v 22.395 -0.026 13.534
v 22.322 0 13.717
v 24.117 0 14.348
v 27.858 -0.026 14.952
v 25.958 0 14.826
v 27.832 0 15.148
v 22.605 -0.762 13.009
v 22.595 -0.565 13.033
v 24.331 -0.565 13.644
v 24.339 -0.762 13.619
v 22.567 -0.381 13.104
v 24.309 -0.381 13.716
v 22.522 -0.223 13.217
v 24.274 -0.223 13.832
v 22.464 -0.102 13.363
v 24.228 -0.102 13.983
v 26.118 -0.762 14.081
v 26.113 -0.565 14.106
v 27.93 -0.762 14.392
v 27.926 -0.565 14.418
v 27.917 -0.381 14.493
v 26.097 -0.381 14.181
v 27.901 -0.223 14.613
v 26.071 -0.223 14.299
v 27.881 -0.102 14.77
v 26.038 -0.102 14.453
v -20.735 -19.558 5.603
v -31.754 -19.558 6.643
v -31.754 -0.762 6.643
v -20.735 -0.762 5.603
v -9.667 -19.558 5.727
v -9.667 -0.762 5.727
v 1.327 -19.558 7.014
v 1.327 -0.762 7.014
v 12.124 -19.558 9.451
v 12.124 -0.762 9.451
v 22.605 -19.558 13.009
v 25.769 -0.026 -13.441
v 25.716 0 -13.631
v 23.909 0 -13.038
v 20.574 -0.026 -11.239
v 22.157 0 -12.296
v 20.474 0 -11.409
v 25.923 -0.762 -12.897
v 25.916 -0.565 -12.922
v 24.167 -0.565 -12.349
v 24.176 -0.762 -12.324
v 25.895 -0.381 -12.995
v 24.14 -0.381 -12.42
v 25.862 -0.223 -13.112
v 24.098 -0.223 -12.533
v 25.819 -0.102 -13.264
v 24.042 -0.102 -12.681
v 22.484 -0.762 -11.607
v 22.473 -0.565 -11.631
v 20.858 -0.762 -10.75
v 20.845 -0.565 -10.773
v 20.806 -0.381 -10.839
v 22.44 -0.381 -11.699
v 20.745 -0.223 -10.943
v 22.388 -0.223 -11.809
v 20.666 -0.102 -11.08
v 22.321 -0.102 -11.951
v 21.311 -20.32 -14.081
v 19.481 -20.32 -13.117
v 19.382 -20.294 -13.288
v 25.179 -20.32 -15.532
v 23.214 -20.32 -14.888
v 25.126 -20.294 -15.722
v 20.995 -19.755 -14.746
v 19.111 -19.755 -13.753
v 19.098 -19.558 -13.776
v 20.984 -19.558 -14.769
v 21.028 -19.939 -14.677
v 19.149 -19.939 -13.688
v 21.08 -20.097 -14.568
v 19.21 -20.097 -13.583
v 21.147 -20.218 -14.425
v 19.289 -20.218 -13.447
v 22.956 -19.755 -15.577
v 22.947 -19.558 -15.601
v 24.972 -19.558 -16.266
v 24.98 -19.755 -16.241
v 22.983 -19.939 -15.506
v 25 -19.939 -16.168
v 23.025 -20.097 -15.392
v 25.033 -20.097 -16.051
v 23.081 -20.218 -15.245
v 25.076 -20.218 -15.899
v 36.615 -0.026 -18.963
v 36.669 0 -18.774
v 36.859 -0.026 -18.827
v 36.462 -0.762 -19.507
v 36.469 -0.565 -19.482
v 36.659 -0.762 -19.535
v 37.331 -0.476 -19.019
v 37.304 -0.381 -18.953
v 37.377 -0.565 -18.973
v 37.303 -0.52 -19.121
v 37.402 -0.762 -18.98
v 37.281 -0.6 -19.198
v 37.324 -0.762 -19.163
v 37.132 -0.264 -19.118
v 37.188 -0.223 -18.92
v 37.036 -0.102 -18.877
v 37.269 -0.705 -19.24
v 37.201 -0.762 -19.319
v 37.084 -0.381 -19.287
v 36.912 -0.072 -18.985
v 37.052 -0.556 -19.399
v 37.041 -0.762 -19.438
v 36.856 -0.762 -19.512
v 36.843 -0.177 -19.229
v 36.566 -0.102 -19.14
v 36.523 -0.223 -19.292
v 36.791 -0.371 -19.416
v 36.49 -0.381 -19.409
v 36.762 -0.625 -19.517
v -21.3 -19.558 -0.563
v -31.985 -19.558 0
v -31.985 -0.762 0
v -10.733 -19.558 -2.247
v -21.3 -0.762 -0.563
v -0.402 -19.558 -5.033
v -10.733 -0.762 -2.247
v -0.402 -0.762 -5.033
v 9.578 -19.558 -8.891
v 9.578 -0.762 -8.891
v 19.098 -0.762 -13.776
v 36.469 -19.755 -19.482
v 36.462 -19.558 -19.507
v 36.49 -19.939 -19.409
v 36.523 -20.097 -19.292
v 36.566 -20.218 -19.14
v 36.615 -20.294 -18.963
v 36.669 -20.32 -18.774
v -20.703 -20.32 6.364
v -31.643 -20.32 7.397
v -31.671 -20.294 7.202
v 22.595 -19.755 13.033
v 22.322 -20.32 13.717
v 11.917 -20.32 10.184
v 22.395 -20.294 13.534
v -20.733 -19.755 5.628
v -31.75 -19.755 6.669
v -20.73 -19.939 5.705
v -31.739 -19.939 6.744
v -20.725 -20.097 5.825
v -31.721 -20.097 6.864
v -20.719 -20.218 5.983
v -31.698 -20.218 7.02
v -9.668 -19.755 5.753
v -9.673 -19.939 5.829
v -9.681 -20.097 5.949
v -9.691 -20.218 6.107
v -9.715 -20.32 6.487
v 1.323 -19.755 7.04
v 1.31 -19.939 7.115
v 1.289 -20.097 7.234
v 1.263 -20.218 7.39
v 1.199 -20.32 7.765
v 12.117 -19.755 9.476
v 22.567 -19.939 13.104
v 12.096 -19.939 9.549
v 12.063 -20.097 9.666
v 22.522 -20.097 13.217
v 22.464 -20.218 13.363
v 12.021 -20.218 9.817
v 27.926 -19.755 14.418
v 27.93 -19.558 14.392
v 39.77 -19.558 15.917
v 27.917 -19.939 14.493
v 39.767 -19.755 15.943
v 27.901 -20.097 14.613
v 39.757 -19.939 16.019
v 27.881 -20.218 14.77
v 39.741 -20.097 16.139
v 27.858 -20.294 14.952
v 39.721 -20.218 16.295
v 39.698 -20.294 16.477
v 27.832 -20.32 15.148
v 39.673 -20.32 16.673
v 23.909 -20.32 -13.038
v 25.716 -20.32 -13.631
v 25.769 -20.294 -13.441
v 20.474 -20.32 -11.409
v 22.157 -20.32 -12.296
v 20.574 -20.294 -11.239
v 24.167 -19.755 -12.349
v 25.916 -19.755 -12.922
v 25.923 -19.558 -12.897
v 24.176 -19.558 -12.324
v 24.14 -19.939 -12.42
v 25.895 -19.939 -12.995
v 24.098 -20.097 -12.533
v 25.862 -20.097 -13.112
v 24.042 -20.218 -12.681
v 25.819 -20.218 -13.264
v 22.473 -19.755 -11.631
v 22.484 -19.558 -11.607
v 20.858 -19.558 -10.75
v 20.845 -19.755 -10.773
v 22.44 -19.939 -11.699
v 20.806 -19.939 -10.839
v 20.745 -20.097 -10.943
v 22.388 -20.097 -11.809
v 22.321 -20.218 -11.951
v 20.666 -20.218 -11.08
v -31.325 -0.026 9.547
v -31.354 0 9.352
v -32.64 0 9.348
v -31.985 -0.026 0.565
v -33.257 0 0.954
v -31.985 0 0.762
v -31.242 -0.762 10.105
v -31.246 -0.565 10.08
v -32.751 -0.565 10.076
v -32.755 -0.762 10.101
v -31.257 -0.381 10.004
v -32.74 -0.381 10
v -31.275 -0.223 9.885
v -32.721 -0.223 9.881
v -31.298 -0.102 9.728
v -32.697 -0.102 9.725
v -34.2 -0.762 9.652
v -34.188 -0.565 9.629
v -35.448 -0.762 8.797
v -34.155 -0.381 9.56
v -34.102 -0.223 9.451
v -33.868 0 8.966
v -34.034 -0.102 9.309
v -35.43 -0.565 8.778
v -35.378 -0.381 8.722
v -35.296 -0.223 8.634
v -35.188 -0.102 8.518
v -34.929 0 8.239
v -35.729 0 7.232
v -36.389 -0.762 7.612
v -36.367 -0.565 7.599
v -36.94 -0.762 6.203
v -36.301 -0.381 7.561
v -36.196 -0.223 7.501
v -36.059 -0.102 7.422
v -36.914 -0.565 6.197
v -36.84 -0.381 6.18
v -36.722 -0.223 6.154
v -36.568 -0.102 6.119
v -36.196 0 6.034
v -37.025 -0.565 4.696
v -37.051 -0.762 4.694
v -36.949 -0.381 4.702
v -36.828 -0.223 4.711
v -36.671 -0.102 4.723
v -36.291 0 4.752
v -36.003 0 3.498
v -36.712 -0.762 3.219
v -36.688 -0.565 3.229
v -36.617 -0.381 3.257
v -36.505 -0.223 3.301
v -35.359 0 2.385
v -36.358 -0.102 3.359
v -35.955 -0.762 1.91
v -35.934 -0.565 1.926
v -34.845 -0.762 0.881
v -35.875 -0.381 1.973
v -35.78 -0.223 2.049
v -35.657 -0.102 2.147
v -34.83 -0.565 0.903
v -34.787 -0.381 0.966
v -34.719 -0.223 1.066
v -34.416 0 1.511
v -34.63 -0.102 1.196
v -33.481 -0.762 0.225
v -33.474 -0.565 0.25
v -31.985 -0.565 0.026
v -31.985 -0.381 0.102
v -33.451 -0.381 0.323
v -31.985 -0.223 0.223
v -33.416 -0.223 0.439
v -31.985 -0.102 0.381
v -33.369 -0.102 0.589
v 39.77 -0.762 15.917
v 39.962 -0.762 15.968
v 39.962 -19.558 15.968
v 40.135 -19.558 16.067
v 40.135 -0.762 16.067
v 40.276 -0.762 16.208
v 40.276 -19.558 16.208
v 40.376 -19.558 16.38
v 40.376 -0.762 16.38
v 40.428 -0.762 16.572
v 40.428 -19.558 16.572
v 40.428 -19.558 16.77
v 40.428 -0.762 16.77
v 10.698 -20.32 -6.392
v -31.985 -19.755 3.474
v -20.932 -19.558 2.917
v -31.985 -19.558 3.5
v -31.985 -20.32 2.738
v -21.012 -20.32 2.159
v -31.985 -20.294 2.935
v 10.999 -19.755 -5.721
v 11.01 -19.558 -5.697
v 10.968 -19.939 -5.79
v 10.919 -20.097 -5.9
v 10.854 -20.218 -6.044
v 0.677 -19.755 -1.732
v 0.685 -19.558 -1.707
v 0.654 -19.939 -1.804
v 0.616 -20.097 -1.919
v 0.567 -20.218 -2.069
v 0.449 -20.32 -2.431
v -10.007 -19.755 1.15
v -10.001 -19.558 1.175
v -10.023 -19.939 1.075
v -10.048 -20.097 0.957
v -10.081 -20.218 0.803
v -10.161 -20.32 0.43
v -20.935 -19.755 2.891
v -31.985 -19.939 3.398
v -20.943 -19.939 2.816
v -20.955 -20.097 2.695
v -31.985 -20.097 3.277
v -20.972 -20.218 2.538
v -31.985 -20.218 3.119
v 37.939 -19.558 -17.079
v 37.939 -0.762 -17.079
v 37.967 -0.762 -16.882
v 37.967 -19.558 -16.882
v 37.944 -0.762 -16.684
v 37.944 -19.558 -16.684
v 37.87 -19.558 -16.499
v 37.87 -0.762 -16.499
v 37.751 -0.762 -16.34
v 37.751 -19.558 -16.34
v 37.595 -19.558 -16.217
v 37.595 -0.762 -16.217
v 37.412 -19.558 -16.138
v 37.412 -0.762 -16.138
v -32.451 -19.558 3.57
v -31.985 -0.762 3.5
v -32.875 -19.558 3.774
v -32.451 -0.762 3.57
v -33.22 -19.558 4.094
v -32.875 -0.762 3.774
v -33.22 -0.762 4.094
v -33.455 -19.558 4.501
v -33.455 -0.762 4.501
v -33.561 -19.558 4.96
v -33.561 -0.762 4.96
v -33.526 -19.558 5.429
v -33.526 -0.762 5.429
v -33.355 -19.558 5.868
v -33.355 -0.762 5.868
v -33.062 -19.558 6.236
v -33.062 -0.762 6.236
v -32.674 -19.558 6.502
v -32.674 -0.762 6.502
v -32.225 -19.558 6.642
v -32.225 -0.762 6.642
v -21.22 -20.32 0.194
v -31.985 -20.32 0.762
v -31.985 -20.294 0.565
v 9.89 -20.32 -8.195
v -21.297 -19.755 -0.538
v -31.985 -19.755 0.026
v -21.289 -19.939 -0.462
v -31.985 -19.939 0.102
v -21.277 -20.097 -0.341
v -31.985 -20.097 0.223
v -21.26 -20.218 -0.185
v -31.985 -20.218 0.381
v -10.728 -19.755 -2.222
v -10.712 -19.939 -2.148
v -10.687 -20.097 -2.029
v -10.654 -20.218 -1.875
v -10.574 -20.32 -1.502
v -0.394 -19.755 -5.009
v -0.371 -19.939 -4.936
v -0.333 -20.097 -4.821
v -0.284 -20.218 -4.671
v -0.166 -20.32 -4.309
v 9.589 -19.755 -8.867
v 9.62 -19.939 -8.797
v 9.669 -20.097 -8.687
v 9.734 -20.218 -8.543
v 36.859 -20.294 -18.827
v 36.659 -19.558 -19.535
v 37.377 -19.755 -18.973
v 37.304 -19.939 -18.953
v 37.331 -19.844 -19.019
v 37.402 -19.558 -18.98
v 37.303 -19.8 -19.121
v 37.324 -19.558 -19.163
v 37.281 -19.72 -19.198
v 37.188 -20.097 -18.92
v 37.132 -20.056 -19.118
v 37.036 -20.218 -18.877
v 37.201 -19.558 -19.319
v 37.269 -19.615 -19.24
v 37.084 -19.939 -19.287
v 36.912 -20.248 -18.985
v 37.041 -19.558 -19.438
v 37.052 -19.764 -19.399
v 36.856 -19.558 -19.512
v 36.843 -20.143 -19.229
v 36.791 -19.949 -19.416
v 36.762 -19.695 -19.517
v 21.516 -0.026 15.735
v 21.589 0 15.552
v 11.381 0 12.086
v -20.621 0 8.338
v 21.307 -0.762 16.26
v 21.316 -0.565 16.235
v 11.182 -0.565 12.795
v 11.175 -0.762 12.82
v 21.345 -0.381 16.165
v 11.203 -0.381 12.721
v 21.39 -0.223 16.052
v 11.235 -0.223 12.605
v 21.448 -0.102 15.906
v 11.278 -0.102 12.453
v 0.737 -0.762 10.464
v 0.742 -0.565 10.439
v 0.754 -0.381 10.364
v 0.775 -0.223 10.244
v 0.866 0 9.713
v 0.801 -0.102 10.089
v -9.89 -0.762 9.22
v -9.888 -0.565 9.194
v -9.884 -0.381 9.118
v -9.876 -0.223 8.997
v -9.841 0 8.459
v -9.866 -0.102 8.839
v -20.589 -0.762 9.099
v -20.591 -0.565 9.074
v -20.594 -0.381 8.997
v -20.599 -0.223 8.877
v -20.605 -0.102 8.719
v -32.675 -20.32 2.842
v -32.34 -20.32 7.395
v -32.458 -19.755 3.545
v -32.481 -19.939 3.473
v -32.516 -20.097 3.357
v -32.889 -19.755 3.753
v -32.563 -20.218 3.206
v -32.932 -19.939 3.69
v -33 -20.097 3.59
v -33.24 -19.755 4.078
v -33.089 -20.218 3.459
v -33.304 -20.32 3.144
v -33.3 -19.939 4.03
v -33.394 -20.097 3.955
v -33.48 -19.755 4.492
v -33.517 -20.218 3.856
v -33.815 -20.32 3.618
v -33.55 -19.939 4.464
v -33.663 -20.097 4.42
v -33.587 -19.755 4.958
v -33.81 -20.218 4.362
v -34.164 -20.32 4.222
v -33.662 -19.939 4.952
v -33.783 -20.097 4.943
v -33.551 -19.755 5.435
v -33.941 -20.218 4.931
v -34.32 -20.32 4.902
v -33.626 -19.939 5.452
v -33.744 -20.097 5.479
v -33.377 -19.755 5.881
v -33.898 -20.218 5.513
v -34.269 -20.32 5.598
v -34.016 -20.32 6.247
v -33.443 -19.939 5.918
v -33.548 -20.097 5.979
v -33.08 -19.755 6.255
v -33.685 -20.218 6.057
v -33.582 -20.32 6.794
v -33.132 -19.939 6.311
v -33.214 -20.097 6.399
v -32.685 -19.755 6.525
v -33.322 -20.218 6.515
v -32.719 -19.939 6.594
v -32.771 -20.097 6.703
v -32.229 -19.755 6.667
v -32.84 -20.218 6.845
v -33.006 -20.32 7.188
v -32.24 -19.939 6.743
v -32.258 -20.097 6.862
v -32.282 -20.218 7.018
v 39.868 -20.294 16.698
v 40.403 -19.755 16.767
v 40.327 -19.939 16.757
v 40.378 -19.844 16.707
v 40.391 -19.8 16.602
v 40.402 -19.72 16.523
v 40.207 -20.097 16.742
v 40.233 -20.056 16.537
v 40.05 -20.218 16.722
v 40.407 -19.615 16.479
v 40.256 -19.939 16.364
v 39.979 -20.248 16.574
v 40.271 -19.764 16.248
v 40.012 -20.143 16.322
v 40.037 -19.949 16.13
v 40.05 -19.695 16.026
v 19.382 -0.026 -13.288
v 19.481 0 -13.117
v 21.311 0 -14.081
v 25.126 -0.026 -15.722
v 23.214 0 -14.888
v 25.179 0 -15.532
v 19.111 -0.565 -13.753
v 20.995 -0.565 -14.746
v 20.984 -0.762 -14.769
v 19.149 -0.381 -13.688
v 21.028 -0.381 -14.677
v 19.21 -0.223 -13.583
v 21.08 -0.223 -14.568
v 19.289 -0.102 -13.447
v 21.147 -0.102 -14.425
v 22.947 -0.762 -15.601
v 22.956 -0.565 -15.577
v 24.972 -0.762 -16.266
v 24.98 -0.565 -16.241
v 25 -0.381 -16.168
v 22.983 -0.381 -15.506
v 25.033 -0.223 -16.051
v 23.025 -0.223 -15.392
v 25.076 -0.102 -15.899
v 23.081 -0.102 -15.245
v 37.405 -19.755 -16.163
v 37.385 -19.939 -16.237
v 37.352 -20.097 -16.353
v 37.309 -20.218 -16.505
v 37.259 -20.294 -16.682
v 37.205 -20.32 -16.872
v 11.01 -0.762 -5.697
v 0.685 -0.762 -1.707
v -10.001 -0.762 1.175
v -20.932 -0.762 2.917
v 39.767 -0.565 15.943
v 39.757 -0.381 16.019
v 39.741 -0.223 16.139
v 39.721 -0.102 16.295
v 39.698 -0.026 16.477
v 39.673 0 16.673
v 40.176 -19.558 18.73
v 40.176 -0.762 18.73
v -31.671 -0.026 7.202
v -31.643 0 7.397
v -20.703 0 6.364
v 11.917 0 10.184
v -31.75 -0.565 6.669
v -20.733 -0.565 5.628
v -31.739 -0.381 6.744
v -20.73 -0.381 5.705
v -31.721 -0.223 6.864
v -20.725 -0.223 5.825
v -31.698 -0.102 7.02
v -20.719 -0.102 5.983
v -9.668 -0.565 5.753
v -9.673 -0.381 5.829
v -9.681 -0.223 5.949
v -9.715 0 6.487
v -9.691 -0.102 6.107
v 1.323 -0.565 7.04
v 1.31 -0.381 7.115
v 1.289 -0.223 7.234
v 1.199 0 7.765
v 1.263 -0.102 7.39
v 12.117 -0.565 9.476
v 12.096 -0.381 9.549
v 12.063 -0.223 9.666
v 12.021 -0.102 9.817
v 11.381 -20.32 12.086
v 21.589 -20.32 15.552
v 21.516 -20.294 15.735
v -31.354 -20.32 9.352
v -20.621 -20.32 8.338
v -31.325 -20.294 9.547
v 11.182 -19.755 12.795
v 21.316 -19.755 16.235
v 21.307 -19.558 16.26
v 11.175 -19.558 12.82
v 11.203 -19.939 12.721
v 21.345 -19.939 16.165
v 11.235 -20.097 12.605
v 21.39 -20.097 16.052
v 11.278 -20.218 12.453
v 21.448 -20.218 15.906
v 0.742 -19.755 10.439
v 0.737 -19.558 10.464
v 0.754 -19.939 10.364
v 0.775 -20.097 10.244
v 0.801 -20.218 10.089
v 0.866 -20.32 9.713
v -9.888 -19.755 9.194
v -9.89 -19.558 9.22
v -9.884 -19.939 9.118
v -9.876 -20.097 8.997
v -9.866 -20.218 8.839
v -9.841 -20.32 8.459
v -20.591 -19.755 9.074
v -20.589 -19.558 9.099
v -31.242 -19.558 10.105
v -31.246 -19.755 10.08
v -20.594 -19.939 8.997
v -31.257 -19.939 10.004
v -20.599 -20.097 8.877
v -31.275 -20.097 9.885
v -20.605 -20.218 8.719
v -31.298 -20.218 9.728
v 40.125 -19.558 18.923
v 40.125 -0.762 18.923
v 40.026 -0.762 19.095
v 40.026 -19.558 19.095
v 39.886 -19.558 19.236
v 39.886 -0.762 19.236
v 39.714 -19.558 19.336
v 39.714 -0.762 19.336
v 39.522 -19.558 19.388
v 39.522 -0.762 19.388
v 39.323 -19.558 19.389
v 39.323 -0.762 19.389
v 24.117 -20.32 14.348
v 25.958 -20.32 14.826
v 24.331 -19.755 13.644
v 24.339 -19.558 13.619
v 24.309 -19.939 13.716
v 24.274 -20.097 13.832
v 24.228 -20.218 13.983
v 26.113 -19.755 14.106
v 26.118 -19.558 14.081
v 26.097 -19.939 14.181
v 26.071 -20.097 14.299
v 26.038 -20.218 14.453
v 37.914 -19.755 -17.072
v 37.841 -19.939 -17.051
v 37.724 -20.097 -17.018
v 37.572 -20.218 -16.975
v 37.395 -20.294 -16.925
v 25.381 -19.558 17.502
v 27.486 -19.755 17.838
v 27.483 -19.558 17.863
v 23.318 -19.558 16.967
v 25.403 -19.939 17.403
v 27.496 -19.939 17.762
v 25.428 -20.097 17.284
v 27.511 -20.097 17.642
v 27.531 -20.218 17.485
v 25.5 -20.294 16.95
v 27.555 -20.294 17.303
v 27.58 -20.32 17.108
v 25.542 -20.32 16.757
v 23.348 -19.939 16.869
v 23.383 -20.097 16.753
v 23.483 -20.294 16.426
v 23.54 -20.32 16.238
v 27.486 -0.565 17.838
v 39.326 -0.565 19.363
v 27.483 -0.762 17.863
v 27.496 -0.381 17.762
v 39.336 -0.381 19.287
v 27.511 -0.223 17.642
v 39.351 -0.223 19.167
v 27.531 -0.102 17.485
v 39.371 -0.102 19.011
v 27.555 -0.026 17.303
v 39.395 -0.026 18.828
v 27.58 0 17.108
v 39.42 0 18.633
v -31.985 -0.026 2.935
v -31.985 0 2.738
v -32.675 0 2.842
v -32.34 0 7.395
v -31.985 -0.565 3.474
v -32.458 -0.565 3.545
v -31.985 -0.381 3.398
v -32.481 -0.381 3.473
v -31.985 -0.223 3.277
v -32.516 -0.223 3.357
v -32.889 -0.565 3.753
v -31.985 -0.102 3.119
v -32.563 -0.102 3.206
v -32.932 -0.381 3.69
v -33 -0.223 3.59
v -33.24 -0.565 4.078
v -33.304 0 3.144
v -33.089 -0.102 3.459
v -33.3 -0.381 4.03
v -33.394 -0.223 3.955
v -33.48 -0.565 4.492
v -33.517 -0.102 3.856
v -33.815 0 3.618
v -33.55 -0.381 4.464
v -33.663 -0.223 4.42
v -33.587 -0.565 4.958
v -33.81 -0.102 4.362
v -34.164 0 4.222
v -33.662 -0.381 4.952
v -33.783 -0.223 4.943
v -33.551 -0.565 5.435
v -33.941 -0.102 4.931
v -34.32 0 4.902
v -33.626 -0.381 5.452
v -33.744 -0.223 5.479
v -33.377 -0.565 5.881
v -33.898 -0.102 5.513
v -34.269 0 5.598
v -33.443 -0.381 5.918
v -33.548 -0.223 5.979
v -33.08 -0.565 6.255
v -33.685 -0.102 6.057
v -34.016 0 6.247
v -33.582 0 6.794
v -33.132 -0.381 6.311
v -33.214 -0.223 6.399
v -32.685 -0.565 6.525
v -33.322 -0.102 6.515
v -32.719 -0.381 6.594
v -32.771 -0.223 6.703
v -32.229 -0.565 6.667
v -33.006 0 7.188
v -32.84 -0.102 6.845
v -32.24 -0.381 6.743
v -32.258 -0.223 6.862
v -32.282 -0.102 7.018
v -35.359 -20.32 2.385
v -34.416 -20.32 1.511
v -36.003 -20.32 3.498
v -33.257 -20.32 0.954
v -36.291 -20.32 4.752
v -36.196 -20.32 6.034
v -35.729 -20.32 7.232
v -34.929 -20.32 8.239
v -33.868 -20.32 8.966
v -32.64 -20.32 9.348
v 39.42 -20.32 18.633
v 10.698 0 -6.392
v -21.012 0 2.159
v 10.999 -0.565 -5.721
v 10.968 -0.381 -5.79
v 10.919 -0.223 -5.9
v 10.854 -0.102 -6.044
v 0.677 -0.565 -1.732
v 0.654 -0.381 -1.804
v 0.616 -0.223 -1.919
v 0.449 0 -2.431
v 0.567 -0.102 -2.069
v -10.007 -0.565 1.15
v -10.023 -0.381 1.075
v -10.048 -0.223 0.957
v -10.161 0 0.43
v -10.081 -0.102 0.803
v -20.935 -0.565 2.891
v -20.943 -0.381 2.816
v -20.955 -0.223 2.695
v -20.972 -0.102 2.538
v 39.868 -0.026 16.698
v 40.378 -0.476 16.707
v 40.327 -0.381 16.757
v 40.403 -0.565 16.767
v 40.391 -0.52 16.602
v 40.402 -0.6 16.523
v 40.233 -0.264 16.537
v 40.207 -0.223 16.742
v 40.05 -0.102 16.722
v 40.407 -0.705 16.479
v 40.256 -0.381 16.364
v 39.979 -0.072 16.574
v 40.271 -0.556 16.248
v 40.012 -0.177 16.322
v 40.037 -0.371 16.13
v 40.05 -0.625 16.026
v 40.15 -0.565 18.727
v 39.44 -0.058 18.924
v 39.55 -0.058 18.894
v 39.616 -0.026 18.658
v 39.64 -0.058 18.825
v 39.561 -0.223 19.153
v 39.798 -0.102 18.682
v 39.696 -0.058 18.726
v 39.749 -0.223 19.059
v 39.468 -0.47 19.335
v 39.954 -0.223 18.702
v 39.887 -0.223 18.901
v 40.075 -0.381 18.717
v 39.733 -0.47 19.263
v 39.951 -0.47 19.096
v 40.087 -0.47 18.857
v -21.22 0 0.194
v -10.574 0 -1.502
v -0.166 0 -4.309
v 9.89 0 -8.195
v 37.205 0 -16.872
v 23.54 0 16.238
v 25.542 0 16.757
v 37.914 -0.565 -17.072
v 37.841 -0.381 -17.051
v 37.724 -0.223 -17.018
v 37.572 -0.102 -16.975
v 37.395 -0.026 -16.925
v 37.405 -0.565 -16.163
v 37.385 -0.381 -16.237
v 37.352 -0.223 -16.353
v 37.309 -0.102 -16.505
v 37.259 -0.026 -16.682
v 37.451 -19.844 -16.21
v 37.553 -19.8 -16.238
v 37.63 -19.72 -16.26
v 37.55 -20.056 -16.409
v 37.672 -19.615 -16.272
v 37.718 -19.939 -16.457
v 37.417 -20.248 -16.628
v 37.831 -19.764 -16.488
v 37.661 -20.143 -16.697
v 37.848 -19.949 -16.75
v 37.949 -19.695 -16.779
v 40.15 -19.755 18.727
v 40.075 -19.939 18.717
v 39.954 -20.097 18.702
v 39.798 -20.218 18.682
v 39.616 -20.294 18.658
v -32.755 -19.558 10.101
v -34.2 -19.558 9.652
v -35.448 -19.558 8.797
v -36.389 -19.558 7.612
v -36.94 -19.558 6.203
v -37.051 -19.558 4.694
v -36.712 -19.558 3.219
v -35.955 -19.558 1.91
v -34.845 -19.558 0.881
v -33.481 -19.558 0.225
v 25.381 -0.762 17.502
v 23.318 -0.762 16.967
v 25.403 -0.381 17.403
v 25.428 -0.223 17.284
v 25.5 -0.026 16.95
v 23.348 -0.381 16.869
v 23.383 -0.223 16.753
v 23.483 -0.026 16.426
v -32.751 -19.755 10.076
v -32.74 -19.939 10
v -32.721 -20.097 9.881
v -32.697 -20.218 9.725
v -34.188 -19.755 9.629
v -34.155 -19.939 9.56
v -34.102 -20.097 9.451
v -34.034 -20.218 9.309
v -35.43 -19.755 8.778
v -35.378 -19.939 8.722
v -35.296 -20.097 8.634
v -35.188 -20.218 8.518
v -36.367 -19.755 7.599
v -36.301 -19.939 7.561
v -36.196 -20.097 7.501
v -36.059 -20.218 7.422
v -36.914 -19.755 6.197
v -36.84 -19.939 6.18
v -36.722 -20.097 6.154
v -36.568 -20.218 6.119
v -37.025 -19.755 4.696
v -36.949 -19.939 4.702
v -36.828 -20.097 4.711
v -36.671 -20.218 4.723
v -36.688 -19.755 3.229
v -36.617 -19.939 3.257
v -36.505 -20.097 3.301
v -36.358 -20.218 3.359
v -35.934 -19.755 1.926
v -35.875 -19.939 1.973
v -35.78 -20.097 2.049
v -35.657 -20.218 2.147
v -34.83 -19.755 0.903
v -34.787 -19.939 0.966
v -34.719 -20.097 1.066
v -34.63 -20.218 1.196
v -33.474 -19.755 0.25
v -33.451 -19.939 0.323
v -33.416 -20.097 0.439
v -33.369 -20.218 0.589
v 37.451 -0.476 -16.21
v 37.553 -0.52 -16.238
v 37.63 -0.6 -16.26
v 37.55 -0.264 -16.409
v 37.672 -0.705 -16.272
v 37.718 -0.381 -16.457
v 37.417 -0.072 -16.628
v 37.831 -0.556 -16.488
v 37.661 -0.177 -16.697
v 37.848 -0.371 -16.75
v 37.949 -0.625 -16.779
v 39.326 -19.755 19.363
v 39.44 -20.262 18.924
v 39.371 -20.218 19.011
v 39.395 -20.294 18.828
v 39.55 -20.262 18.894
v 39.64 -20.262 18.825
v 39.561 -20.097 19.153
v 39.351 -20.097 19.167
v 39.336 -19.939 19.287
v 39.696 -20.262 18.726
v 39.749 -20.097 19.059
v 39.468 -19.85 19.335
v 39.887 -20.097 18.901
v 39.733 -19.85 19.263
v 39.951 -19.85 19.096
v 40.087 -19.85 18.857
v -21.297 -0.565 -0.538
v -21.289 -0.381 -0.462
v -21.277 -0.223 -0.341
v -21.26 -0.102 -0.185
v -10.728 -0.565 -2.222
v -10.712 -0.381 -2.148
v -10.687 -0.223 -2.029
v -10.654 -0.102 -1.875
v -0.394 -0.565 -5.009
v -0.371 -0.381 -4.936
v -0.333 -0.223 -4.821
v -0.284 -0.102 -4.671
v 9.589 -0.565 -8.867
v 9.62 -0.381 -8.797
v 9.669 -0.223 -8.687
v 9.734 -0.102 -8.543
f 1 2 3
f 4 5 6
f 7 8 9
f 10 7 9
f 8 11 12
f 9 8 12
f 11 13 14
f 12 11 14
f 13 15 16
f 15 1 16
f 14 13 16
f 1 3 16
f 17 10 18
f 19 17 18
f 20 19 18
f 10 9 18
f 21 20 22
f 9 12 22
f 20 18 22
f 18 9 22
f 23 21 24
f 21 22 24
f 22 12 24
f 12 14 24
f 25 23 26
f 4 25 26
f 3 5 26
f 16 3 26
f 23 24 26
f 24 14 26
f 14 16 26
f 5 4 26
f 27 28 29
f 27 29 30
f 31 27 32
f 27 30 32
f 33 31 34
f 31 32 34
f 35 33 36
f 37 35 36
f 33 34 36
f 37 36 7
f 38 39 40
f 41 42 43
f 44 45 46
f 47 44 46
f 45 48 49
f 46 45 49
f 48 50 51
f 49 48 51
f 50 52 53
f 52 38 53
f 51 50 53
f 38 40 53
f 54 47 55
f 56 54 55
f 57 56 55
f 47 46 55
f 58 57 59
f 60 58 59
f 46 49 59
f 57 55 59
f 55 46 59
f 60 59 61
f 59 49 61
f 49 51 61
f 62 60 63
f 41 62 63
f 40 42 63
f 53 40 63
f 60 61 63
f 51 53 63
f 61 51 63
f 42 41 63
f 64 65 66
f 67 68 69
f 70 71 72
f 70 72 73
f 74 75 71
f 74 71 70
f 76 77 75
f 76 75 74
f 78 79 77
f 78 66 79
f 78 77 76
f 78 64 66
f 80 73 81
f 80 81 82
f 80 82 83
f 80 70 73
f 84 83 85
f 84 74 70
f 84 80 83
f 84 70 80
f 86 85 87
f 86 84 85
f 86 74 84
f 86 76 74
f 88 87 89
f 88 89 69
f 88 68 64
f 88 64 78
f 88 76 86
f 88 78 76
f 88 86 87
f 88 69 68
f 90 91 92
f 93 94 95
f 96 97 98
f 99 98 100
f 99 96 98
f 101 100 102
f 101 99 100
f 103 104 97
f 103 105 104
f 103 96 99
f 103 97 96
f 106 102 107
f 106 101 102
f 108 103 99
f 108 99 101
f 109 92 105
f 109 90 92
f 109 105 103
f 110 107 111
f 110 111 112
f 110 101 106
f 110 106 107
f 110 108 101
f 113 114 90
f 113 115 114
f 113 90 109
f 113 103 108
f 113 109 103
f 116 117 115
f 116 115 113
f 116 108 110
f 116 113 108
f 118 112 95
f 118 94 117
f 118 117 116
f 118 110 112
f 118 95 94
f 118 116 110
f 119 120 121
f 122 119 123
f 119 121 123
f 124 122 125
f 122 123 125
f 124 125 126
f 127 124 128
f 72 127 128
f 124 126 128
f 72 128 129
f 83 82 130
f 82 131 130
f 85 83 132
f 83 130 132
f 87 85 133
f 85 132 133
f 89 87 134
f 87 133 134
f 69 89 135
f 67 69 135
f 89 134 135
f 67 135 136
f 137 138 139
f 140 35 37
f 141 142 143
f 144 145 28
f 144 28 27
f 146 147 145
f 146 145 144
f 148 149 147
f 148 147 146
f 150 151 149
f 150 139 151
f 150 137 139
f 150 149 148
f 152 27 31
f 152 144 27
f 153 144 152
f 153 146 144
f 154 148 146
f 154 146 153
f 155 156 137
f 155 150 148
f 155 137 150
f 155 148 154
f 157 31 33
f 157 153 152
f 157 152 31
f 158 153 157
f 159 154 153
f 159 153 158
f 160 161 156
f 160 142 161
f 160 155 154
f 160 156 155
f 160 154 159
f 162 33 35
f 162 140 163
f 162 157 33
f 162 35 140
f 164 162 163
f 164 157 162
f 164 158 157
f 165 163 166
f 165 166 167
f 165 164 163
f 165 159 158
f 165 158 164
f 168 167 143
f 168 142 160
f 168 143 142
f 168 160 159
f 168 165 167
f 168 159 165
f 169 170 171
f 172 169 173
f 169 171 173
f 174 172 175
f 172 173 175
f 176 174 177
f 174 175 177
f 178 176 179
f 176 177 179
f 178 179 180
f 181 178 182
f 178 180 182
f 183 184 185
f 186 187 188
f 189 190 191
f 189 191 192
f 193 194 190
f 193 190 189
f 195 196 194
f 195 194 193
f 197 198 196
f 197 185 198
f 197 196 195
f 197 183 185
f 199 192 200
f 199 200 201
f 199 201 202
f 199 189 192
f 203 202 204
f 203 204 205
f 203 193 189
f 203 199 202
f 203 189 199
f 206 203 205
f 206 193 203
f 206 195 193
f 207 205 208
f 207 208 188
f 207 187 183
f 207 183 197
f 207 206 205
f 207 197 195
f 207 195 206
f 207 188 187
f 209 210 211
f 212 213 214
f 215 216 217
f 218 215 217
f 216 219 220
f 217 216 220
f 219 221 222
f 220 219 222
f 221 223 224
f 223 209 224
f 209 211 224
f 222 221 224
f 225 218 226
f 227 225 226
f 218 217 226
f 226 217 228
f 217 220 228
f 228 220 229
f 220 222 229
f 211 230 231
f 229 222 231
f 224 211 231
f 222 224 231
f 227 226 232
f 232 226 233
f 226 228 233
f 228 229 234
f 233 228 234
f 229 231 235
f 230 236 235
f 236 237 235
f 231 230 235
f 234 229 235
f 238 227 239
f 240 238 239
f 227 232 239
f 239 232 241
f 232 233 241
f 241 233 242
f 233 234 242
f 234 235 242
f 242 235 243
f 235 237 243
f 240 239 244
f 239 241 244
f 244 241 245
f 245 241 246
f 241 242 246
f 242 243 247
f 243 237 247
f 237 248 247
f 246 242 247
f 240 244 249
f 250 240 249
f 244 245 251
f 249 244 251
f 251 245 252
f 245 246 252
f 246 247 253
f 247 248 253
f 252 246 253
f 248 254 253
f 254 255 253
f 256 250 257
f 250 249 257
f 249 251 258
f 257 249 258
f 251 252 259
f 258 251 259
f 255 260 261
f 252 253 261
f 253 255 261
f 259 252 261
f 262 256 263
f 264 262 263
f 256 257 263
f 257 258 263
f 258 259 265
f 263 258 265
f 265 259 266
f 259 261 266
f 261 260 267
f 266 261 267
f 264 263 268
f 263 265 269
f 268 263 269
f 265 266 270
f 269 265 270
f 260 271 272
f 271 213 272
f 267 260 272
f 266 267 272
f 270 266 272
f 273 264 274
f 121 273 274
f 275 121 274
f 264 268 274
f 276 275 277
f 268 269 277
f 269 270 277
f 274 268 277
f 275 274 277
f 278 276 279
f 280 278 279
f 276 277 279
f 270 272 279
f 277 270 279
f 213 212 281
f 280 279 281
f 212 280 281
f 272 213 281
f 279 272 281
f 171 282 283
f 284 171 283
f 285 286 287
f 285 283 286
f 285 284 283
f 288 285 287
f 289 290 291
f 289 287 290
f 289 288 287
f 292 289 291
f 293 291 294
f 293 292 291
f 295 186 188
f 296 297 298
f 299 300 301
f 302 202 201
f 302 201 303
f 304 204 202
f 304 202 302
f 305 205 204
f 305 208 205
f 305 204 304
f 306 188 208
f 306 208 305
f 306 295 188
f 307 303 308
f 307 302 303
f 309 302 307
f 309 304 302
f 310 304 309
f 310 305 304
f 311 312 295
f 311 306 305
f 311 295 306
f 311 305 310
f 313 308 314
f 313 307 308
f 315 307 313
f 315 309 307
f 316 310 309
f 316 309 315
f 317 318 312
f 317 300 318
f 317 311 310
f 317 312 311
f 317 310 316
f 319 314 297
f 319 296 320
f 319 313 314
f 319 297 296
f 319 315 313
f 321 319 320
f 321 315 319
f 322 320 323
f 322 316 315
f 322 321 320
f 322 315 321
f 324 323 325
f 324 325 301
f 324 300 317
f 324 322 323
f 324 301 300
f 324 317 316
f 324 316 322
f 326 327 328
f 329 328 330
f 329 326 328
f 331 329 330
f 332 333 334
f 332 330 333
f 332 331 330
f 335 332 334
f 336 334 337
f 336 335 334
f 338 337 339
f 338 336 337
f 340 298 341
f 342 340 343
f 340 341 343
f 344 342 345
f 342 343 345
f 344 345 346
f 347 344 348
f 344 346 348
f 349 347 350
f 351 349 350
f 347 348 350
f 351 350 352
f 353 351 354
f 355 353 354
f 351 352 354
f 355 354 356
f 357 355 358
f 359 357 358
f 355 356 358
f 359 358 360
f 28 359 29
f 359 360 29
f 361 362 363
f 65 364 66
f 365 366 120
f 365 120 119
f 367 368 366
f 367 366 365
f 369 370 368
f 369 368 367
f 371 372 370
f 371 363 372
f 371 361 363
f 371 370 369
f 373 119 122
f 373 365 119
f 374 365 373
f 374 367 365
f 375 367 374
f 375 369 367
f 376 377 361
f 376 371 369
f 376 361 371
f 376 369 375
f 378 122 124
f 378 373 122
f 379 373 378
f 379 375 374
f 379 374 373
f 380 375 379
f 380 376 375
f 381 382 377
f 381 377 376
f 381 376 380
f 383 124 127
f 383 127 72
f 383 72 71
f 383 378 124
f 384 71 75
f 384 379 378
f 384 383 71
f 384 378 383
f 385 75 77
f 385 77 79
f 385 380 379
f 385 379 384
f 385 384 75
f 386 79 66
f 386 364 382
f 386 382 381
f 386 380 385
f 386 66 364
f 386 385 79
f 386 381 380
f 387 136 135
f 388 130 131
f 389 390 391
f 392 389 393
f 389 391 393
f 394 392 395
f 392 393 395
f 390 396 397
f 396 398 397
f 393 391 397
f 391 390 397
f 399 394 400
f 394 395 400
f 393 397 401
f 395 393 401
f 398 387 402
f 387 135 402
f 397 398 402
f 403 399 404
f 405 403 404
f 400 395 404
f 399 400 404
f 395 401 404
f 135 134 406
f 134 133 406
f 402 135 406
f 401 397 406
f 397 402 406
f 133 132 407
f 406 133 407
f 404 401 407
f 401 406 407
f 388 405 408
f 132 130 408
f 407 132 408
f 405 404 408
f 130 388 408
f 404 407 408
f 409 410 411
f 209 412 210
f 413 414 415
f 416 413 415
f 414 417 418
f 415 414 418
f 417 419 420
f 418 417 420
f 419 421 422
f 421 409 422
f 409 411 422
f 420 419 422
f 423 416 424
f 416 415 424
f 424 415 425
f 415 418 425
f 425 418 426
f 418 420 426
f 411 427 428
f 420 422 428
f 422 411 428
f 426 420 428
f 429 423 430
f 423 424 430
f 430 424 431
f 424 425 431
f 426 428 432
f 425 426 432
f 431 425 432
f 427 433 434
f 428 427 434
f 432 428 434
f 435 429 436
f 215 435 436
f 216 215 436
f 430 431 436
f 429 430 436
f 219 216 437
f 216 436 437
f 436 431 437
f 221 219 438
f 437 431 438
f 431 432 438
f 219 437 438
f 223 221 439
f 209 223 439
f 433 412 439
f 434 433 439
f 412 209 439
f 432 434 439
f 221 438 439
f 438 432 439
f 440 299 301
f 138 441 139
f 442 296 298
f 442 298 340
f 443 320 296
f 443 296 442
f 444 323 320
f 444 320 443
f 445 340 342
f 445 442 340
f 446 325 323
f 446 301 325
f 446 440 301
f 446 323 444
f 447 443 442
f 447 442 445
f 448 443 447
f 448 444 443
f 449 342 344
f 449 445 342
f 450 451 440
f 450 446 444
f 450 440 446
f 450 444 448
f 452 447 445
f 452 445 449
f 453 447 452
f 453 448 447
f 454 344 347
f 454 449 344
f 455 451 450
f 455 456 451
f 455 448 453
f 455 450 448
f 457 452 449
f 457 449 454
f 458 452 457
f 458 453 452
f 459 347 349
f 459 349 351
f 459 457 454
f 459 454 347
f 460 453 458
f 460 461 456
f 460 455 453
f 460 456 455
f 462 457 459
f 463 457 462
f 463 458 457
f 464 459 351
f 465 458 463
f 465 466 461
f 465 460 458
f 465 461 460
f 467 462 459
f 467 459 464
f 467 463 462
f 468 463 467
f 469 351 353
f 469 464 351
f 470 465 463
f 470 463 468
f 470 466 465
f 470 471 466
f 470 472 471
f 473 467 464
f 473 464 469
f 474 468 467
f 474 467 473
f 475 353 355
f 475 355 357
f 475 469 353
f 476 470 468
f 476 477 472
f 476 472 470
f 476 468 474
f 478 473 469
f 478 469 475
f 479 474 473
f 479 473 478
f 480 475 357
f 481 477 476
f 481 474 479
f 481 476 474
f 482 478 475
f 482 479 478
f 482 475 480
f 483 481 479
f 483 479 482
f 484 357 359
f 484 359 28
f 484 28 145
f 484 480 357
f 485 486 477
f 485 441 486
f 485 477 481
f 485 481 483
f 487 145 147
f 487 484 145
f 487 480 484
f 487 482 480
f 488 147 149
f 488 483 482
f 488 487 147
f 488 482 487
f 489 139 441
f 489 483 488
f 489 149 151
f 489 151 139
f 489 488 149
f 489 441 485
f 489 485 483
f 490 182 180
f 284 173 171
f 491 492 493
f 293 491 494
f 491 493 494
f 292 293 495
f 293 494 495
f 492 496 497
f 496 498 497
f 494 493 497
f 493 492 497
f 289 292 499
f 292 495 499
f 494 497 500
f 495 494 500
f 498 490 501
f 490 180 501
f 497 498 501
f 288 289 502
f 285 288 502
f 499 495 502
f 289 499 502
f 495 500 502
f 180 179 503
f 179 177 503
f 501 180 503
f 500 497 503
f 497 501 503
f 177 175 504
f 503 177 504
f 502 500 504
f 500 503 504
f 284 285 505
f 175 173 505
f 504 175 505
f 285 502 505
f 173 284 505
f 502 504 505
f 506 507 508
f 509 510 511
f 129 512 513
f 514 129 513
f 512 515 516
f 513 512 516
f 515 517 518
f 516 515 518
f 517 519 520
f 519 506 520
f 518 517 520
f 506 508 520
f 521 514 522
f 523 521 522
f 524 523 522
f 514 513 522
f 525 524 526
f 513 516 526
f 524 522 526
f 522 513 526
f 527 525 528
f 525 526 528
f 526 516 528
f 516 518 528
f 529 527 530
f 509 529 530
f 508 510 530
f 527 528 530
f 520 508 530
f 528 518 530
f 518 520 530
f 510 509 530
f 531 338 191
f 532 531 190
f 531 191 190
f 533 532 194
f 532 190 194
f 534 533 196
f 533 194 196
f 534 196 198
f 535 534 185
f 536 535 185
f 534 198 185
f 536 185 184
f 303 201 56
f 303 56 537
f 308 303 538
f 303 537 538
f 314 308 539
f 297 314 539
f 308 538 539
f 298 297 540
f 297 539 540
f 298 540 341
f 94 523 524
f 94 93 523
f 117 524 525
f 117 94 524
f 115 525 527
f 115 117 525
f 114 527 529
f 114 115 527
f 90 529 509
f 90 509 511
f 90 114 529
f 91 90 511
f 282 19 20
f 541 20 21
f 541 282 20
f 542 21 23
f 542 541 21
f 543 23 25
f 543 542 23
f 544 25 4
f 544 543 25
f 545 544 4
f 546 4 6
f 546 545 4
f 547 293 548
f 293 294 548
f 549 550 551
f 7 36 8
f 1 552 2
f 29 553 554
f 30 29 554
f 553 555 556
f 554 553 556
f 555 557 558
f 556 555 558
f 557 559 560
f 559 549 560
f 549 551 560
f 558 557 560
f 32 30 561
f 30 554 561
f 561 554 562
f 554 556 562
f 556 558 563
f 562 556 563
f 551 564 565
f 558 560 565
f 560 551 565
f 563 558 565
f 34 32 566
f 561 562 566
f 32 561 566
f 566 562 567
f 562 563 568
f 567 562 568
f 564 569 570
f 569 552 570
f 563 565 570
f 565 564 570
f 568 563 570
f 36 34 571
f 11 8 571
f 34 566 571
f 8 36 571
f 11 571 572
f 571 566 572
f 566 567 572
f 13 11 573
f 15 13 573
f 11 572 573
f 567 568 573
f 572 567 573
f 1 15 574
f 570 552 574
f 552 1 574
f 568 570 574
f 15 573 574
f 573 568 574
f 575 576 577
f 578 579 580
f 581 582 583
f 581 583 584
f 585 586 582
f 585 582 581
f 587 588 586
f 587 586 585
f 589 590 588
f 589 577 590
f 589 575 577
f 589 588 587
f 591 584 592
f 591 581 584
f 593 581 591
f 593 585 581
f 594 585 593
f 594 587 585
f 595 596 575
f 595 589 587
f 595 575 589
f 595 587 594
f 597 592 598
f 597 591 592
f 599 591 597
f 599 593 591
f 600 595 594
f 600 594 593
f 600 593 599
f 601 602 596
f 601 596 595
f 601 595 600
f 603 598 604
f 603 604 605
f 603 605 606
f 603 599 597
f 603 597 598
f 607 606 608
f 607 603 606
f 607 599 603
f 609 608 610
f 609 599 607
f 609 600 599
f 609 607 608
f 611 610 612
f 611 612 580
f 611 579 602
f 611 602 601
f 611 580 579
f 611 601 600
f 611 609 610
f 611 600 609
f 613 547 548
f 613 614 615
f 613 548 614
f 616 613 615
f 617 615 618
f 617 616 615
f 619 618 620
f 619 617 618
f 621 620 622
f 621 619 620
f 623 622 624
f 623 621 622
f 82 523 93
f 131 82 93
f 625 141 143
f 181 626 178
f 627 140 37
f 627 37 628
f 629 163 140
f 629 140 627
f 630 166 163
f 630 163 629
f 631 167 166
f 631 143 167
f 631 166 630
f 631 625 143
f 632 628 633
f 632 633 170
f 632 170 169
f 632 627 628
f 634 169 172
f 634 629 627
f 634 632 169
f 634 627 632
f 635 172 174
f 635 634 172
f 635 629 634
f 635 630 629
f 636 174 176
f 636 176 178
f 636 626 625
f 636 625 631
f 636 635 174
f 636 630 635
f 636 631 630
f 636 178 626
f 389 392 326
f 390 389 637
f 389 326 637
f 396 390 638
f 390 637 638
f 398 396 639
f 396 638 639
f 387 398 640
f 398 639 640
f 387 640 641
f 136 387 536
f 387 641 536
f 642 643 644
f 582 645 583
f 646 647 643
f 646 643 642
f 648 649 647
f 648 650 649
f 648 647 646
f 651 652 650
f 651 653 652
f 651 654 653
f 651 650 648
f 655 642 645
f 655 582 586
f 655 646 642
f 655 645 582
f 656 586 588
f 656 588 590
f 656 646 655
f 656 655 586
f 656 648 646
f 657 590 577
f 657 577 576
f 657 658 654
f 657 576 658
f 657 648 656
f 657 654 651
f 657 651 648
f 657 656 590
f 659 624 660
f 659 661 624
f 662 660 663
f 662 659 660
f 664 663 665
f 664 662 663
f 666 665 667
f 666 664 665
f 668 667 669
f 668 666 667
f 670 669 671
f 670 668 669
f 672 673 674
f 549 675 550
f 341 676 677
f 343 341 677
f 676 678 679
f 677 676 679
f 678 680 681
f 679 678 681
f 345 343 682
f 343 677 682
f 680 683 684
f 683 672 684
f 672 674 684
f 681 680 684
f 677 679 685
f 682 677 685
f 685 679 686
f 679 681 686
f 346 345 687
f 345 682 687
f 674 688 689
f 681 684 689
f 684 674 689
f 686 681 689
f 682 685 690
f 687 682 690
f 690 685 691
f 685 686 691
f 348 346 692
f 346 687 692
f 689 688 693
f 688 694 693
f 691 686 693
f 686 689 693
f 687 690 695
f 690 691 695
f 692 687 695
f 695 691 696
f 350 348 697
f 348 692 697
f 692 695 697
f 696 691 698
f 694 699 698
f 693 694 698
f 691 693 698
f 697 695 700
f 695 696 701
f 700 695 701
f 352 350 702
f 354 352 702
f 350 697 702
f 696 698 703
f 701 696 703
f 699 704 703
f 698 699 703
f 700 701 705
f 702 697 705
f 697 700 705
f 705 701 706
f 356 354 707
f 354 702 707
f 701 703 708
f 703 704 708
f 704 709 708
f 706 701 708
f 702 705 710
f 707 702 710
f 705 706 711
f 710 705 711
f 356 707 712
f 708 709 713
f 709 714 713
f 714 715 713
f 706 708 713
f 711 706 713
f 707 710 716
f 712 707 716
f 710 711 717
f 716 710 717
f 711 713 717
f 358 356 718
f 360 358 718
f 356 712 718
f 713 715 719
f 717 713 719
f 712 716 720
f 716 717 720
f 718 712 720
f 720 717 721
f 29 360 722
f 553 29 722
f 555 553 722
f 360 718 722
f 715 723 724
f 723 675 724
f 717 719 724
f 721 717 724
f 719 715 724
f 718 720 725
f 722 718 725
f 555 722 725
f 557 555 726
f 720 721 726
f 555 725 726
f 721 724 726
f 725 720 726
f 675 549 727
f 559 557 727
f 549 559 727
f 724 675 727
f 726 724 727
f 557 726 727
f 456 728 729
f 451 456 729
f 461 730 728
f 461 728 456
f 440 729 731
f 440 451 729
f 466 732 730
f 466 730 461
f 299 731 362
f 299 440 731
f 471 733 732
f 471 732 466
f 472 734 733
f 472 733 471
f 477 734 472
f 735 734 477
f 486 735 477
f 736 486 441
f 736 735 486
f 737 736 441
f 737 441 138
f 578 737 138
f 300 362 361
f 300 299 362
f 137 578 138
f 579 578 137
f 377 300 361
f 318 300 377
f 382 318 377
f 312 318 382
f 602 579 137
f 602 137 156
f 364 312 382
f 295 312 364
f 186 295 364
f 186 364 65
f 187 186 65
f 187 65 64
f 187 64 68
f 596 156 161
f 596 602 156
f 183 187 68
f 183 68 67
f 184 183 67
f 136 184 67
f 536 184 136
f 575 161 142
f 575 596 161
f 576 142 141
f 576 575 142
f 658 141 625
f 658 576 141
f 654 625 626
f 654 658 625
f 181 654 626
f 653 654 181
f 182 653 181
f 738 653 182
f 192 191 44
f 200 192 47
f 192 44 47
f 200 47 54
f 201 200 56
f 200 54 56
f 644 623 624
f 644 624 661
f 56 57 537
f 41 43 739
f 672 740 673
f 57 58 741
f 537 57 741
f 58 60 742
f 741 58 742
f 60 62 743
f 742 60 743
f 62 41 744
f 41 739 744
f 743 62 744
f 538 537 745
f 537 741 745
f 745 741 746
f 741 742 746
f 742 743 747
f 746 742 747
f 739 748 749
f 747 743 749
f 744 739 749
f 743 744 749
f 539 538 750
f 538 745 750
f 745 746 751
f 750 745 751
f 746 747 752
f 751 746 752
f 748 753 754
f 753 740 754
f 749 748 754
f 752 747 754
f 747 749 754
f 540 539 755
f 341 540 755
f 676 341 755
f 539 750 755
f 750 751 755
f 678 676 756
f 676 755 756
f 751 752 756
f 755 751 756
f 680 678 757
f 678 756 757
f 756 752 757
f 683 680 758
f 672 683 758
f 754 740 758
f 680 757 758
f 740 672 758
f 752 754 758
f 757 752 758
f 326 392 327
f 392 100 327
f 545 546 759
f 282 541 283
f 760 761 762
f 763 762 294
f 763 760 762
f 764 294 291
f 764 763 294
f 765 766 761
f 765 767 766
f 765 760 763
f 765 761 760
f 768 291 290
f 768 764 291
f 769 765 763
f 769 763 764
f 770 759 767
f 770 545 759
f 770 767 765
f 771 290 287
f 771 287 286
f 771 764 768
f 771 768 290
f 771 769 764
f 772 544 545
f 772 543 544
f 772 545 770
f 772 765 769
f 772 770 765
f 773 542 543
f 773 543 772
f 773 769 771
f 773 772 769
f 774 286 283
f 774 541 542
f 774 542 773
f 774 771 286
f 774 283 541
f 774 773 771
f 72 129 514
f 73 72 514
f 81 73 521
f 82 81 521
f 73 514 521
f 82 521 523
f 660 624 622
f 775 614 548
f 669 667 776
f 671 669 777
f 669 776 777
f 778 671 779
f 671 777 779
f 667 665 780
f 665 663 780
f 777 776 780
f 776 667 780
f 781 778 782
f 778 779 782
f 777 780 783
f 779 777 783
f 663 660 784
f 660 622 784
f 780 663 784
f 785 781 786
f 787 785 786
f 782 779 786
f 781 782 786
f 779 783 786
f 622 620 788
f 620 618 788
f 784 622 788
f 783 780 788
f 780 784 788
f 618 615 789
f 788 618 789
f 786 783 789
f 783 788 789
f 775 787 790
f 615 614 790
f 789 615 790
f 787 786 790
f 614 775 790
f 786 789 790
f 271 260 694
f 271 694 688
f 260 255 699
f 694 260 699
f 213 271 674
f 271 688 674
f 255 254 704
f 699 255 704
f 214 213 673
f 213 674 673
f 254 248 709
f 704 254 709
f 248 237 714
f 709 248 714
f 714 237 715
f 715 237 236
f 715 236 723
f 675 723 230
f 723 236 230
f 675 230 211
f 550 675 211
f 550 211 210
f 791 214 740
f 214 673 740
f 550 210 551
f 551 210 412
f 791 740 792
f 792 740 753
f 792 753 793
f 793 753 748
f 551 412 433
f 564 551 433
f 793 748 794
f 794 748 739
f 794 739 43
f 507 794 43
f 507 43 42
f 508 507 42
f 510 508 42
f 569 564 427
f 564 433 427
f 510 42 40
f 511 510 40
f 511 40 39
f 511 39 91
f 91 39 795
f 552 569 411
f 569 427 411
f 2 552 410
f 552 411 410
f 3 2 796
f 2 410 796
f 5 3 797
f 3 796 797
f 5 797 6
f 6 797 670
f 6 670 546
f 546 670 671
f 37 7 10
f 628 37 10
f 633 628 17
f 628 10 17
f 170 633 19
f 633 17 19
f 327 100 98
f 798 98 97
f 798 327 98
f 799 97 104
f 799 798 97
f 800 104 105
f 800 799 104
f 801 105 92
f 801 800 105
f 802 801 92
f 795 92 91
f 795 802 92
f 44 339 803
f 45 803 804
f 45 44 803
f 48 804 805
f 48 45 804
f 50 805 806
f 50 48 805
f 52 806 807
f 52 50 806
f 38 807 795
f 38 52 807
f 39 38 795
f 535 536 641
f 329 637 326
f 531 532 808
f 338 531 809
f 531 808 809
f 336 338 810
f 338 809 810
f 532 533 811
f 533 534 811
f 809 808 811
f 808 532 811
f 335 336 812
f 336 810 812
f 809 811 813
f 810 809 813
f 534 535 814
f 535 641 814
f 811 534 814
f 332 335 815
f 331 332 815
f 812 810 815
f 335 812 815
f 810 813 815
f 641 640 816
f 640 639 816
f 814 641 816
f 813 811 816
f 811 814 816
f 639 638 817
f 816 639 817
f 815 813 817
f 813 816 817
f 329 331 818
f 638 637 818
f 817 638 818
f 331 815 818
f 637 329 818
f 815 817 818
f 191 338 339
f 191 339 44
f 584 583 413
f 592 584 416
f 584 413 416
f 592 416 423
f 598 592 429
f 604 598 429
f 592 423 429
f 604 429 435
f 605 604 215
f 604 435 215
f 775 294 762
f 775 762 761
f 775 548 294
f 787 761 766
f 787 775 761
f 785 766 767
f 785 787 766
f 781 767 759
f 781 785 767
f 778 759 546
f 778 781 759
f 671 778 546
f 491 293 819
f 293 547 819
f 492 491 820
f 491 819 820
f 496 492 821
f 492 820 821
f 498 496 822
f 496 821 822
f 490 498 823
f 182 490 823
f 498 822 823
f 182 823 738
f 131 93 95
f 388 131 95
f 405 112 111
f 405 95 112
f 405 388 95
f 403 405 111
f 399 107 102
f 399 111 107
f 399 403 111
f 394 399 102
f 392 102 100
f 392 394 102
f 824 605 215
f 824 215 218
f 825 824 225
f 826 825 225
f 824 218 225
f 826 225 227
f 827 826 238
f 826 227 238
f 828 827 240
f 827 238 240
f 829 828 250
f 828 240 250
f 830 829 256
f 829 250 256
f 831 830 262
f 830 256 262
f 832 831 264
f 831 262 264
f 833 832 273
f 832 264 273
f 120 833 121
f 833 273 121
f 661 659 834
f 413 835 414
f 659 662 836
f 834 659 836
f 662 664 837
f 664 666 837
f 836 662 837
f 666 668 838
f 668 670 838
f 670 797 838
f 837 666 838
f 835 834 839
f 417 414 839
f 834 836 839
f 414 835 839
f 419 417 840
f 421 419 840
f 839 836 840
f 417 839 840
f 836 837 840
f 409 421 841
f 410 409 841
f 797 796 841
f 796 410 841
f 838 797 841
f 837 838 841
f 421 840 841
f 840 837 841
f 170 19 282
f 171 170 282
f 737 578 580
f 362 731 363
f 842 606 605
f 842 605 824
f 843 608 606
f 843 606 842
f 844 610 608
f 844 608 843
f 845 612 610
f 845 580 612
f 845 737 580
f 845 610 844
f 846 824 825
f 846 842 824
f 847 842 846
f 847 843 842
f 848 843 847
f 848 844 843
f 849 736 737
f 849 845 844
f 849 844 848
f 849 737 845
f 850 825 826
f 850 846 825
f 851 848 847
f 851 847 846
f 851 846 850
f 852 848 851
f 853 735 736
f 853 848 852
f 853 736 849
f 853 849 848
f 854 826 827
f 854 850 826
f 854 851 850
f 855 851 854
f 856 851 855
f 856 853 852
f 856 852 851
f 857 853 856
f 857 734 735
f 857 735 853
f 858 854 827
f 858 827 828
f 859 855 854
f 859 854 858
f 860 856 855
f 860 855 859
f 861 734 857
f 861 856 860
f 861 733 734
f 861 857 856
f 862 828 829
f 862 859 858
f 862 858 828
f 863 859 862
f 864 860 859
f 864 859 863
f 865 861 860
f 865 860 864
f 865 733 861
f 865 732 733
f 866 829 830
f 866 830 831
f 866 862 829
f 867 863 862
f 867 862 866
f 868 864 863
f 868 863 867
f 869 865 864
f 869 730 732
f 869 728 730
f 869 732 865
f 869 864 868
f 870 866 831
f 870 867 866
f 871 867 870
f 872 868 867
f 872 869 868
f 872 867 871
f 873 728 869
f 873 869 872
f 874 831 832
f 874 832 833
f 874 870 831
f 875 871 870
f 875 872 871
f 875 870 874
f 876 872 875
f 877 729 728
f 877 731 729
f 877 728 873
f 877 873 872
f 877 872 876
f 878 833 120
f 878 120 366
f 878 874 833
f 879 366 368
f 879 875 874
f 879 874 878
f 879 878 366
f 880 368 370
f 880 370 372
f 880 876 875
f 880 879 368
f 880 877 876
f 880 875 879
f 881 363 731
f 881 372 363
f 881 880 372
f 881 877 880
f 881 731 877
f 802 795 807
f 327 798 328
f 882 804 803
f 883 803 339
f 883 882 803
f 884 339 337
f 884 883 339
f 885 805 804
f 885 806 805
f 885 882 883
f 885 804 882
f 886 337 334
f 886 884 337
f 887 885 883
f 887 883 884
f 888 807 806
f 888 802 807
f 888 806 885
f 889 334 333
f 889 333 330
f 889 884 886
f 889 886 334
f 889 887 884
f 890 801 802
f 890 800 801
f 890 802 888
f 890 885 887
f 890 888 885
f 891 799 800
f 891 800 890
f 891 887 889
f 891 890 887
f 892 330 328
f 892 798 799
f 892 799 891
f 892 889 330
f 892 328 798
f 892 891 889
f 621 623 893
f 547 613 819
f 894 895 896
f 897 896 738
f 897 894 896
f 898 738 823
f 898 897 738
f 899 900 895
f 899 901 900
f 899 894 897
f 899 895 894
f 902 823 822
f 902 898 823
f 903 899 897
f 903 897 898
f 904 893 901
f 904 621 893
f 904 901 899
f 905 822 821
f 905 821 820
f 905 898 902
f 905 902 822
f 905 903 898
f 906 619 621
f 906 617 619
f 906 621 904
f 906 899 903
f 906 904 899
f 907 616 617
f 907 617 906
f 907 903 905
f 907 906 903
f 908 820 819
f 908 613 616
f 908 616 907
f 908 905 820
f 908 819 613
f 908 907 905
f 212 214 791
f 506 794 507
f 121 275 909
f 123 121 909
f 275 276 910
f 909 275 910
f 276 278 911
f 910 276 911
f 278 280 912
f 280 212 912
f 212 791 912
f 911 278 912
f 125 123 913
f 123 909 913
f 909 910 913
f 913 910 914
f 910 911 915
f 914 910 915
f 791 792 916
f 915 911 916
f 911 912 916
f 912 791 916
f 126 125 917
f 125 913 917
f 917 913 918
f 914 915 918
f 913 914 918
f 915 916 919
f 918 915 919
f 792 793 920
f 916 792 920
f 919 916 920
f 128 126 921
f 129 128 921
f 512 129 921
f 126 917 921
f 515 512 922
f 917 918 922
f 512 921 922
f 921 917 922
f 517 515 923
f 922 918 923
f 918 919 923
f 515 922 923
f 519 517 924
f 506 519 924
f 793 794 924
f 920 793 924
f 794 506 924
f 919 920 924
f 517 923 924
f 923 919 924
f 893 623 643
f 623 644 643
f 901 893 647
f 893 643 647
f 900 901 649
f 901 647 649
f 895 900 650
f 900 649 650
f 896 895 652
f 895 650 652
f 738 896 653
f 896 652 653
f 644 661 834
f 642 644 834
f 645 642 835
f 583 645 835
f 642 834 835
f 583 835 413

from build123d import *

# Parameters (mm, degrees)
F1_DEPTH = 20.32
F2_R     = 0.762


with BuildPart() as f1:
    # F0 (on Front) → F1 (new body)
    with BuildSketch(Plane.XZ):
        with BuildLine():
            ThreePointArc((21.306762, 16.25961), (-4.560012, 9.701865), (-31.242051, 10.105342))
            ThreePointArc((-31.242051, 10.105342), (-37.051563, 5.452601), (-31.985246, 0))
            ThreePointArc((-31.985246, 0), (-5.531263, -3.5044), (19.097811, -13.77585))
            ThreePointArc((19.097811, -13.77585), (21.956659, -15.206004), (24.972497, -16.265755))
            Line((24.972497, -16.265755), (37.195468, -19.713795))
            Line((37.195468, -19.713795), (38.145715, -16.34526))
            Line((38.145715, -16.34526), (25.922744, -12.89722))
            ThreePointArc((25.922744, -12.89722), (23.322474, -11.983497), (20.857562, -10.750412))
            ThreePointArc((20.857562, -10.750412), (-4.619955, -0.125122), (-31.985246, 3.5))
            ThreePointArc((-31.985246, 3.5), (-33.56099, 5.195888), (-31.754095, 6.643))
            ThreePointArc((-31.754095, 6.643), (-4.152891, 6.225624), (22.604963, 13.009276))
            ThreePointArc((22.604963, 13.009276), (25.223752, 13.868481), (27.92972, 14.391958))
            Line((27.92972, 14.391958), (40.52562, 16.014699))
            Line((40.52562, 16.014699), (40.078408, 19.486011))
            Line((40.078408, 19.486011), (27.482508, 17.863269))
            ThreePointArc((27.482508, 17.863269), (24.344079, 17.256131), (21.306762, 16.25961))
        make_face()
    extrude(amount=F1_DEPTH)

    # F2
    f2_edges = [f1.edges().sort_by_distance(p)[0] for p in [
        (33.780458, -20.32, 18.67464),
        (24.344079, -20.32, 17.256131),
        (-4.560012, -20.32, 9.701865),
        (-37.051563, -20.32, 5.452601),
        (-5.531263, -20.32, -3.5044),
        (21.956659, -20.32, -15.206004),
        (31.083982, -20.32, -17.989775),
        (37.670591, -20.32, -18.029527),
        (32.034229, -20.32, -14.62124),
        (23.322474, -20.32, -11.983497),
        (-4.619955, -20.32, -0.125122),
        (-33.56099, -20.32, 5.195888),
        (-4.152891, -20.32, 6.225624),
        (25.223752, -20.32, 13.868481),
        (34.22767, -20.32, 15.203329),
        (40.302014, -20.32, 17.750355),
        (33.780458, 0, 18.67464),
        (24.344079, 0, 17.256131),
        (-4.560012, 0, 9.701865),
        (-37.051563, 0, 5.452601),
        (-5.531263, 0, -3.5044),
        (21.956659, 0, -15.206004),
        (31.083982, 0, -17.989775),
        (37.670591, 0, -18.029527),
        (32.034229, 0, -14.62124),
        (23.322474, 0, -11.983497),
        (-4.619955, 0, -0.125122),
        (-33.56099, 0, 5.195888),
        (-4.152891, 0, 6.225624),
        (25.223752, 0, 13.868481),
        (34.22767, 0, 15.203329),
        (40.302014, 0, 17.750355),
        (40.52562, -10.16, 16.014699),
        (40.078408, -10.16, 19.486011),
        (37.195468, -10.16, -19.713795),
        (38.145715, -10.16, -16.34526),
    ]]
    fillet(f2_edges, radius=F2_R)


solid = f1.part
